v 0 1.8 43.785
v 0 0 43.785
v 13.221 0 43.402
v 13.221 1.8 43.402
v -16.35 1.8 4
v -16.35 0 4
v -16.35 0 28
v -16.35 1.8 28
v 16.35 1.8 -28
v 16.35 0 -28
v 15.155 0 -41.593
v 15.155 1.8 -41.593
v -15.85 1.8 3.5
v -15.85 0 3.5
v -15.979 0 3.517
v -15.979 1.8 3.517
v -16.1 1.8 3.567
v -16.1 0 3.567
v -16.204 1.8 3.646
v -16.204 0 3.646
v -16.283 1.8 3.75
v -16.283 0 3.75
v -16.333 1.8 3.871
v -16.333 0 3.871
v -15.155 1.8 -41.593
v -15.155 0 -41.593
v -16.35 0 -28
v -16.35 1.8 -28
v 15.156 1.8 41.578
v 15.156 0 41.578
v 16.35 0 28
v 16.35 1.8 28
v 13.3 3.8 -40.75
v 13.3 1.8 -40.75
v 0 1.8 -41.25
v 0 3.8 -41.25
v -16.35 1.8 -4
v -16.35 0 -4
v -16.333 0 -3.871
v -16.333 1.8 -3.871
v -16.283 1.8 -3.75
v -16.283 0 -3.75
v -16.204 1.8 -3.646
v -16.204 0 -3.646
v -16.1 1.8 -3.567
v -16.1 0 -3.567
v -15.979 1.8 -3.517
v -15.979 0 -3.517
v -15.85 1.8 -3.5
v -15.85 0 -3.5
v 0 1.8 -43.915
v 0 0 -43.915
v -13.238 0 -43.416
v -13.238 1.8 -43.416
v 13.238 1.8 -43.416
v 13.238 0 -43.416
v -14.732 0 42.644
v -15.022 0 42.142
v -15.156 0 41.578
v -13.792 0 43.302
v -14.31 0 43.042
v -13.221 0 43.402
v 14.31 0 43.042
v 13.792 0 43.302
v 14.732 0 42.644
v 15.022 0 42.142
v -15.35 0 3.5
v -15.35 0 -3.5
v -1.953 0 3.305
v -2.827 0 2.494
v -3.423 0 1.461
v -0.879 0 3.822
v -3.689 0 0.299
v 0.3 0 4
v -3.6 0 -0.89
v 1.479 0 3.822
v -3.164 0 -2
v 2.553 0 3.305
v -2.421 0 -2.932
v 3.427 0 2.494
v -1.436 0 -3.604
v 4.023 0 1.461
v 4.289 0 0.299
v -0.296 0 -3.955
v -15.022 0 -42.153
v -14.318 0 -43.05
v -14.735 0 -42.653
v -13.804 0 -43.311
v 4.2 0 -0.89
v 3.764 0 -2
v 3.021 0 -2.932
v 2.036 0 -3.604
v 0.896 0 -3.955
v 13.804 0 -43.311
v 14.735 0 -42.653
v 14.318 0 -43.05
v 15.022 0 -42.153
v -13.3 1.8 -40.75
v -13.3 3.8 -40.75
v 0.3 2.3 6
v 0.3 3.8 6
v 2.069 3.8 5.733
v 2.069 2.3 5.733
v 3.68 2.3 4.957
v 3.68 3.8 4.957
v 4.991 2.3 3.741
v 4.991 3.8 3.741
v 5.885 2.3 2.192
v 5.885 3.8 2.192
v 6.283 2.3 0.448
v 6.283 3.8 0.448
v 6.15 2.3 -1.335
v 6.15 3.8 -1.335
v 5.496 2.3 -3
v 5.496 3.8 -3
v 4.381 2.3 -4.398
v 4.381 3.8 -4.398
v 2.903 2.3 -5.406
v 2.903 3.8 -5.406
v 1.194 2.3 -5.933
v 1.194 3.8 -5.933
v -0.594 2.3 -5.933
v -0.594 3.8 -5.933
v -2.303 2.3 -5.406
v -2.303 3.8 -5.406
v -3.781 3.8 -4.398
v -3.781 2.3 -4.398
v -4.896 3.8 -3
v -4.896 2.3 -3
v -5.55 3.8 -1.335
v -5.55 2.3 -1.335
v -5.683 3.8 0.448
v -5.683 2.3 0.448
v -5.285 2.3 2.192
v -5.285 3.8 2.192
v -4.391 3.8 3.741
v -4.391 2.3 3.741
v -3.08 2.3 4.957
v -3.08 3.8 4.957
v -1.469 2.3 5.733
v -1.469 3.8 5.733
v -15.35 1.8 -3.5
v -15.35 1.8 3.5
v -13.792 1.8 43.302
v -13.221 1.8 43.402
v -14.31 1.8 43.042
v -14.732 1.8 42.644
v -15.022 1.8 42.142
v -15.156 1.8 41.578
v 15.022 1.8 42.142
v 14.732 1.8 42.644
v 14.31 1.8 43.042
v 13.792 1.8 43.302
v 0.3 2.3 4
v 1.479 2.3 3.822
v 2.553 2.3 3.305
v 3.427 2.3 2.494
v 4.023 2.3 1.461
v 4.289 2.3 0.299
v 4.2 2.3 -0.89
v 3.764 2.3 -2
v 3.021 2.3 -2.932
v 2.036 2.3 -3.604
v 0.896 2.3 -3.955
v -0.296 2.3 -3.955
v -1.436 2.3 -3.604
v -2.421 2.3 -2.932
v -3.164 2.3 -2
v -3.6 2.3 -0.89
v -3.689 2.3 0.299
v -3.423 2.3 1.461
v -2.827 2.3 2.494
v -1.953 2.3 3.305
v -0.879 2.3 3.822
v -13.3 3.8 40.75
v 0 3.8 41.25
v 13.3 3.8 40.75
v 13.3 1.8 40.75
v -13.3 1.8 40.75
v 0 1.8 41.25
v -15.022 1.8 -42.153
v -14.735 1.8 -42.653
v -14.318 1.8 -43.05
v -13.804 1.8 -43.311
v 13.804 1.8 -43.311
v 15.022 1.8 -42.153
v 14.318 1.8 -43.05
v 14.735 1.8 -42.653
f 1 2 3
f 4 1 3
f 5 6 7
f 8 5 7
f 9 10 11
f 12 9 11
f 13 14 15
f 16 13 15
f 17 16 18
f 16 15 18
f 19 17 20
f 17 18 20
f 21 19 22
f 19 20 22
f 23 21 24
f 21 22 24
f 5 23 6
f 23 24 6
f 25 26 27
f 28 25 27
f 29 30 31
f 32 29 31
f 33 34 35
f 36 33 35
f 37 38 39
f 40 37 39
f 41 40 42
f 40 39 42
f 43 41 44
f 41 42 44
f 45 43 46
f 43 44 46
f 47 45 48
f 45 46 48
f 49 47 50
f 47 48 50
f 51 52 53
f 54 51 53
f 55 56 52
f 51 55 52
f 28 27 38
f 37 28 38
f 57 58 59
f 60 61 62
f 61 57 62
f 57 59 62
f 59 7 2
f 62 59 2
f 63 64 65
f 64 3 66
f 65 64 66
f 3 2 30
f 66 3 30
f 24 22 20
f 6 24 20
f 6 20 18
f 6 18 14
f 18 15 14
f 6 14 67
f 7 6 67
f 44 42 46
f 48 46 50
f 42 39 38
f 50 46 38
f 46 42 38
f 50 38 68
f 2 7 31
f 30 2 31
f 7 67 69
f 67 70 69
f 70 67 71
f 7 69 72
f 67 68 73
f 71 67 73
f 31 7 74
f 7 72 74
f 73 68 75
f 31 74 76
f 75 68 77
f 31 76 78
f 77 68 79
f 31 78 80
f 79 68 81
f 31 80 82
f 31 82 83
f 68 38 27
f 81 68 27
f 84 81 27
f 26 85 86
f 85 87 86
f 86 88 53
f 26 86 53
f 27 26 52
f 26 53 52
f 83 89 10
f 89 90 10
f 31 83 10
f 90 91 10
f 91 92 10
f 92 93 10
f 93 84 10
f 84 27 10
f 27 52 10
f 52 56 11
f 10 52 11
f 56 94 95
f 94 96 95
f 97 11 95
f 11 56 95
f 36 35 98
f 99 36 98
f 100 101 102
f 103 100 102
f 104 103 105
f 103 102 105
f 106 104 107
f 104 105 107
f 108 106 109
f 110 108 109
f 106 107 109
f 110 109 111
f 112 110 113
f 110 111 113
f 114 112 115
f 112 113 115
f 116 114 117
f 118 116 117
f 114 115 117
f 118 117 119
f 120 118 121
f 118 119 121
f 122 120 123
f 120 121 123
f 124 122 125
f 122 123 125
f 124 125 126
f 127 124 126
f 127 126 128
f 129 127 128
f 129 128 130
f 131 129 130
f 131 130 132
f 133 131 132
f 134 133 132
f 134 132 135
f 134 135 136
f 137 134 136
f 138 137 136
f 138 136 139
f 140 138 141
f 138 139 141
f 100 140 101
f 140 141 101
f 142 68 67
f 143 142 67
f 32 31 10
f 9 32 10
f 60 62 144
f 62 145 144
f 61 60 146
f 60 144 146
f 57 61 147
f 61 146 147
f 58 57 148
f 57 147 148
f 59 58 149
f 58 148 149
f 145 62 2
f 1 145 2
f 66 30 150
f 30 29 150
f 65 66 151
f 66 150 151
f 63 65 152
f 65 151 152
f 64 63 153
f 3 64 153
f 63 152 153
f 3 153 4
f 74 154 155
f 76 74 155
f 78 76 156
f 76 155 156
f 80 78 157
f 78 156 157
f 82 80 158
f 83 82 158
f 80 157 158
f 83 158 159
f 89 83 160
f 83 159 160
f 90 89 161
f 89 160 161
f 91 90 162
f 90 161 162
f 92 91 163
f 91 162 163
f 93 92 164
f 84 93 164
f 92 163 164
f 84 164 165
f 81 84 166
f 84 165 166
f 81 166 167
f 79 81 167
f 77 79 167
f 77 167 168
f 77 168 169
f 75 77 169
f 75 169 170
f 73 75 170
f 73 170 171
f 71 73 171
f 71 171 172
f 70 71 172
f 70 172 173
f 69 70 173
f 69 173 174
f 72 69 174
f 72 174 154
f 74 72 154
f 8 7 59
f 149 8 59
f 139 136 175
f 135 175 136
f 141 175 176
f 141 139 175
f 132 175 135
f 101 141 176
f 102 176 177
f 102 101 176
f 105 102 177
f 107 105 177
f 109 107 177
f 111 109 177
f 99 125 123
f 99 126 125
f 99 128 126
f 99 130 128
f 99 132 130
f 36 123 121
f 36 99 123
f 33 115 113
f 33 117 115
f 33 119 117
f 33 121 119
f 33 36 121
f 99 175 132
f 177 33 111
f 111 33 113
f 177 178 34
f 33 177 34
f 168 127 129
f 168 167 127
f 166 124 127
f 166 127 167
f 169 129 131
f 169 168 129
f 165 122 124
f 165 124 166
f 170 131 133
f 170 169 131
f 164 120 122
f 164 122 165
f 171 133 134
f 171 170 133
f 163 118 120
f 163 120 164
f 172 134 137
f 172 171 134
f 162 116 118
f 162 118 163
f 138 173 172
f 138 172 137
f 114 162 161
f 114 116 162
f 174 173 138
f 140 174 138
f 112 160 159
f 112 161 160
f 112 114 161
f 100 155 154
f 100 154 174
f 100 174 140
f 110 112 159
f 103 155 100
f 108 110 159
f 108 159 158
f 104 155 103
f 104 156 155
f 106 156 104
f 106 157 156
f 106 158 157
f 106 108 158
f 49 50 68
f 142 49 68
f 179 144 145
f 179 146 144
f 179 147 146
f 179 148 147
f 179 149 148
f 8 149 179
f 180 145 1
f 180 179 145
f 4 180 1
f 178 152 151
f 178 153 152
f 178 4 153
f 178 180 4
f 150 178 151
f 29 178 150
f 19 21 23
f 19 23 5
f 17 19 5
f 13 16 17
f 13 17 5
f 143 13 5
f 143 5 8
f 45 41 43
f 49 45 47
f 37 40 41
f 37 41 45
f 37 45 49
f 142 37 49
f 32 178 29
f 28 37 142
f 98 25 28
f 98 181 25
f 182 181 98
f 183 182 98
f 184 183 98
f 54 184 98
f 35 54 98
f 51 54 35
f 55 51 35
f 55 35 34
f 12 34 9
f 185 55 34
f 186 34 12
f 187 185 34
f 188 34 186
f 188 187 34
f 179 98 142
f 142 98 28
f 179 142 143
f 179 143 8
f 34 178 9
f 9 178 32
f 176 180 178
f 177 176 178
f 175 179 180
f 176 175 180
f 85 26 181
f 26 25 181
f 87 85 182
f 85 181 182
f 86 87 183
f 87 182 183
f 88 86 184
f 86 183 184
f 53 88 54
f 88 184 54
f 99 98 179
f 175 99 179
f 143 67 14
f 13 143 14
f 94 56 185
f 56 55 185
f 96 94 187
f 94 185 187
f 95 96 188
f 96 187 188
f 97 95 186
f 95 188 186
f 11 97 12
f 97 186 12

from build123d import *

# Parameters (mm, degrees)
EXTRUDE_1_DEPTH     = 1.8
EXTRUDE_2_DEPTH     = 3.8
FILLET_1_R          = 2
SKETCH_5_R          = 4
CUT_EXTRUDE_1_DEPTH = 4
SKETCH_6_R          = 6
CUT_EXTRUDE_2_DEPTH = 1.5


with BuildPart() as part:
    # Эскиз1 → Бобышка-Вытянуть1 (new body)
    with BuildSketch(Plane(origin=(0, 0, 0), x_dir=(1, 0, 0), z_dir=(0, 1, 0))):
        with BuildLine():
            Line((-15, 43.349382745), (-16.35, 28))
            Line((-16.35, 28), (-16.35, 4))
            ThreePointArc((-16.35, 4), (-16.203553391, 3.646446609), (-15.85, 3.5))
            Line((-15.85, 3.5), (-15.35, 3.5))
            Line((-15.35, 3.5), (-15.35, -3.5))
            Line((-15.35, -3.5), (-15.85, -3.5))
            ThreePointArc((-15.85, -3.5), (-16.203553391, -3.646446609), (-16.35, -4))
            Line((-16.35, -4), (-16.35, -28))
            Line((-16.35, -28), (-15, -43.35061617))
            Line((-15, -43.35061617), (0, -43.784698928))
            Line((0, -43.784698928), (15, -43.35061617))
            Line((15, -43.35061617), (16.35, -28))
            Line((16.35, -28), (16.35, 28))
            Line((16.35, 28), (15, 43.349382745))
            Line((15, 43.349382745), (0, 43.915301072))
            Line((0, 43.915301072), (-15, 43.349382745))
        make_face()
    extrude(amount=EXTRUDE_1_DEPTH)

    # Эскиз4 → Бобышка-Вытянуть2 (add)
    with BuildSketch(Plane(origin=(0, 0, 0), x_dir=(1, 0, 0), z_dir=(0, 1, 0))):
        Polygon((-13.3, 40.75), (-13.3, -40.75), (0, -41.25), (13.3, -40.75), (13.3, 40.75), (0, 41.25), align=None)
    extrude(amount=EXTRUDE_2_DEPTH)

    # Скругление1
    fillet_1_edges = [part.edges().sort_by_distance(p)[0] for p in [
        (-15, 0.9, -43.349382745),
        (15, 0.9, -43.349382745),
        (15, 0.9, 43.35061617),
        (-15, 0.9, 43.35061617),
    ]]
    fillet(fillet_1_edges, radius=FILLET_1_R)

    # Эскиз5 → Вырез-Вытянуть1 (cut)
    with BuildSketch(Plane(origin=(0, 3.8, 0), x_dir=(-1, 0, 0), z_dir=(0, 1, 0))):
        with Locations(Location((-0.3, 0, 0), (0, 0, 90))):
            Circle(SKETCH_5_R)
    extrude(amount=-CUT_EXTRUDE_1_DEPTH, mode=Mode.SUBTRACT)

    # Эскиз6 → Вырез-Вытянуть2 (cut)
    with BuildSketch(Plane(origin=(0, 3.8, 0), x_dir=(1, 0, 0), z_dir=(0, 1, 0))):
        with Locations(Location((0.3, 0, 0), (0, 0, 270))):
            Circle(SKETCH_6_R)
    extrude(amount=-CUT_EXTRUDE_2_DEPTH, mode=Mode.SUBTRACT)


solid = part.part
